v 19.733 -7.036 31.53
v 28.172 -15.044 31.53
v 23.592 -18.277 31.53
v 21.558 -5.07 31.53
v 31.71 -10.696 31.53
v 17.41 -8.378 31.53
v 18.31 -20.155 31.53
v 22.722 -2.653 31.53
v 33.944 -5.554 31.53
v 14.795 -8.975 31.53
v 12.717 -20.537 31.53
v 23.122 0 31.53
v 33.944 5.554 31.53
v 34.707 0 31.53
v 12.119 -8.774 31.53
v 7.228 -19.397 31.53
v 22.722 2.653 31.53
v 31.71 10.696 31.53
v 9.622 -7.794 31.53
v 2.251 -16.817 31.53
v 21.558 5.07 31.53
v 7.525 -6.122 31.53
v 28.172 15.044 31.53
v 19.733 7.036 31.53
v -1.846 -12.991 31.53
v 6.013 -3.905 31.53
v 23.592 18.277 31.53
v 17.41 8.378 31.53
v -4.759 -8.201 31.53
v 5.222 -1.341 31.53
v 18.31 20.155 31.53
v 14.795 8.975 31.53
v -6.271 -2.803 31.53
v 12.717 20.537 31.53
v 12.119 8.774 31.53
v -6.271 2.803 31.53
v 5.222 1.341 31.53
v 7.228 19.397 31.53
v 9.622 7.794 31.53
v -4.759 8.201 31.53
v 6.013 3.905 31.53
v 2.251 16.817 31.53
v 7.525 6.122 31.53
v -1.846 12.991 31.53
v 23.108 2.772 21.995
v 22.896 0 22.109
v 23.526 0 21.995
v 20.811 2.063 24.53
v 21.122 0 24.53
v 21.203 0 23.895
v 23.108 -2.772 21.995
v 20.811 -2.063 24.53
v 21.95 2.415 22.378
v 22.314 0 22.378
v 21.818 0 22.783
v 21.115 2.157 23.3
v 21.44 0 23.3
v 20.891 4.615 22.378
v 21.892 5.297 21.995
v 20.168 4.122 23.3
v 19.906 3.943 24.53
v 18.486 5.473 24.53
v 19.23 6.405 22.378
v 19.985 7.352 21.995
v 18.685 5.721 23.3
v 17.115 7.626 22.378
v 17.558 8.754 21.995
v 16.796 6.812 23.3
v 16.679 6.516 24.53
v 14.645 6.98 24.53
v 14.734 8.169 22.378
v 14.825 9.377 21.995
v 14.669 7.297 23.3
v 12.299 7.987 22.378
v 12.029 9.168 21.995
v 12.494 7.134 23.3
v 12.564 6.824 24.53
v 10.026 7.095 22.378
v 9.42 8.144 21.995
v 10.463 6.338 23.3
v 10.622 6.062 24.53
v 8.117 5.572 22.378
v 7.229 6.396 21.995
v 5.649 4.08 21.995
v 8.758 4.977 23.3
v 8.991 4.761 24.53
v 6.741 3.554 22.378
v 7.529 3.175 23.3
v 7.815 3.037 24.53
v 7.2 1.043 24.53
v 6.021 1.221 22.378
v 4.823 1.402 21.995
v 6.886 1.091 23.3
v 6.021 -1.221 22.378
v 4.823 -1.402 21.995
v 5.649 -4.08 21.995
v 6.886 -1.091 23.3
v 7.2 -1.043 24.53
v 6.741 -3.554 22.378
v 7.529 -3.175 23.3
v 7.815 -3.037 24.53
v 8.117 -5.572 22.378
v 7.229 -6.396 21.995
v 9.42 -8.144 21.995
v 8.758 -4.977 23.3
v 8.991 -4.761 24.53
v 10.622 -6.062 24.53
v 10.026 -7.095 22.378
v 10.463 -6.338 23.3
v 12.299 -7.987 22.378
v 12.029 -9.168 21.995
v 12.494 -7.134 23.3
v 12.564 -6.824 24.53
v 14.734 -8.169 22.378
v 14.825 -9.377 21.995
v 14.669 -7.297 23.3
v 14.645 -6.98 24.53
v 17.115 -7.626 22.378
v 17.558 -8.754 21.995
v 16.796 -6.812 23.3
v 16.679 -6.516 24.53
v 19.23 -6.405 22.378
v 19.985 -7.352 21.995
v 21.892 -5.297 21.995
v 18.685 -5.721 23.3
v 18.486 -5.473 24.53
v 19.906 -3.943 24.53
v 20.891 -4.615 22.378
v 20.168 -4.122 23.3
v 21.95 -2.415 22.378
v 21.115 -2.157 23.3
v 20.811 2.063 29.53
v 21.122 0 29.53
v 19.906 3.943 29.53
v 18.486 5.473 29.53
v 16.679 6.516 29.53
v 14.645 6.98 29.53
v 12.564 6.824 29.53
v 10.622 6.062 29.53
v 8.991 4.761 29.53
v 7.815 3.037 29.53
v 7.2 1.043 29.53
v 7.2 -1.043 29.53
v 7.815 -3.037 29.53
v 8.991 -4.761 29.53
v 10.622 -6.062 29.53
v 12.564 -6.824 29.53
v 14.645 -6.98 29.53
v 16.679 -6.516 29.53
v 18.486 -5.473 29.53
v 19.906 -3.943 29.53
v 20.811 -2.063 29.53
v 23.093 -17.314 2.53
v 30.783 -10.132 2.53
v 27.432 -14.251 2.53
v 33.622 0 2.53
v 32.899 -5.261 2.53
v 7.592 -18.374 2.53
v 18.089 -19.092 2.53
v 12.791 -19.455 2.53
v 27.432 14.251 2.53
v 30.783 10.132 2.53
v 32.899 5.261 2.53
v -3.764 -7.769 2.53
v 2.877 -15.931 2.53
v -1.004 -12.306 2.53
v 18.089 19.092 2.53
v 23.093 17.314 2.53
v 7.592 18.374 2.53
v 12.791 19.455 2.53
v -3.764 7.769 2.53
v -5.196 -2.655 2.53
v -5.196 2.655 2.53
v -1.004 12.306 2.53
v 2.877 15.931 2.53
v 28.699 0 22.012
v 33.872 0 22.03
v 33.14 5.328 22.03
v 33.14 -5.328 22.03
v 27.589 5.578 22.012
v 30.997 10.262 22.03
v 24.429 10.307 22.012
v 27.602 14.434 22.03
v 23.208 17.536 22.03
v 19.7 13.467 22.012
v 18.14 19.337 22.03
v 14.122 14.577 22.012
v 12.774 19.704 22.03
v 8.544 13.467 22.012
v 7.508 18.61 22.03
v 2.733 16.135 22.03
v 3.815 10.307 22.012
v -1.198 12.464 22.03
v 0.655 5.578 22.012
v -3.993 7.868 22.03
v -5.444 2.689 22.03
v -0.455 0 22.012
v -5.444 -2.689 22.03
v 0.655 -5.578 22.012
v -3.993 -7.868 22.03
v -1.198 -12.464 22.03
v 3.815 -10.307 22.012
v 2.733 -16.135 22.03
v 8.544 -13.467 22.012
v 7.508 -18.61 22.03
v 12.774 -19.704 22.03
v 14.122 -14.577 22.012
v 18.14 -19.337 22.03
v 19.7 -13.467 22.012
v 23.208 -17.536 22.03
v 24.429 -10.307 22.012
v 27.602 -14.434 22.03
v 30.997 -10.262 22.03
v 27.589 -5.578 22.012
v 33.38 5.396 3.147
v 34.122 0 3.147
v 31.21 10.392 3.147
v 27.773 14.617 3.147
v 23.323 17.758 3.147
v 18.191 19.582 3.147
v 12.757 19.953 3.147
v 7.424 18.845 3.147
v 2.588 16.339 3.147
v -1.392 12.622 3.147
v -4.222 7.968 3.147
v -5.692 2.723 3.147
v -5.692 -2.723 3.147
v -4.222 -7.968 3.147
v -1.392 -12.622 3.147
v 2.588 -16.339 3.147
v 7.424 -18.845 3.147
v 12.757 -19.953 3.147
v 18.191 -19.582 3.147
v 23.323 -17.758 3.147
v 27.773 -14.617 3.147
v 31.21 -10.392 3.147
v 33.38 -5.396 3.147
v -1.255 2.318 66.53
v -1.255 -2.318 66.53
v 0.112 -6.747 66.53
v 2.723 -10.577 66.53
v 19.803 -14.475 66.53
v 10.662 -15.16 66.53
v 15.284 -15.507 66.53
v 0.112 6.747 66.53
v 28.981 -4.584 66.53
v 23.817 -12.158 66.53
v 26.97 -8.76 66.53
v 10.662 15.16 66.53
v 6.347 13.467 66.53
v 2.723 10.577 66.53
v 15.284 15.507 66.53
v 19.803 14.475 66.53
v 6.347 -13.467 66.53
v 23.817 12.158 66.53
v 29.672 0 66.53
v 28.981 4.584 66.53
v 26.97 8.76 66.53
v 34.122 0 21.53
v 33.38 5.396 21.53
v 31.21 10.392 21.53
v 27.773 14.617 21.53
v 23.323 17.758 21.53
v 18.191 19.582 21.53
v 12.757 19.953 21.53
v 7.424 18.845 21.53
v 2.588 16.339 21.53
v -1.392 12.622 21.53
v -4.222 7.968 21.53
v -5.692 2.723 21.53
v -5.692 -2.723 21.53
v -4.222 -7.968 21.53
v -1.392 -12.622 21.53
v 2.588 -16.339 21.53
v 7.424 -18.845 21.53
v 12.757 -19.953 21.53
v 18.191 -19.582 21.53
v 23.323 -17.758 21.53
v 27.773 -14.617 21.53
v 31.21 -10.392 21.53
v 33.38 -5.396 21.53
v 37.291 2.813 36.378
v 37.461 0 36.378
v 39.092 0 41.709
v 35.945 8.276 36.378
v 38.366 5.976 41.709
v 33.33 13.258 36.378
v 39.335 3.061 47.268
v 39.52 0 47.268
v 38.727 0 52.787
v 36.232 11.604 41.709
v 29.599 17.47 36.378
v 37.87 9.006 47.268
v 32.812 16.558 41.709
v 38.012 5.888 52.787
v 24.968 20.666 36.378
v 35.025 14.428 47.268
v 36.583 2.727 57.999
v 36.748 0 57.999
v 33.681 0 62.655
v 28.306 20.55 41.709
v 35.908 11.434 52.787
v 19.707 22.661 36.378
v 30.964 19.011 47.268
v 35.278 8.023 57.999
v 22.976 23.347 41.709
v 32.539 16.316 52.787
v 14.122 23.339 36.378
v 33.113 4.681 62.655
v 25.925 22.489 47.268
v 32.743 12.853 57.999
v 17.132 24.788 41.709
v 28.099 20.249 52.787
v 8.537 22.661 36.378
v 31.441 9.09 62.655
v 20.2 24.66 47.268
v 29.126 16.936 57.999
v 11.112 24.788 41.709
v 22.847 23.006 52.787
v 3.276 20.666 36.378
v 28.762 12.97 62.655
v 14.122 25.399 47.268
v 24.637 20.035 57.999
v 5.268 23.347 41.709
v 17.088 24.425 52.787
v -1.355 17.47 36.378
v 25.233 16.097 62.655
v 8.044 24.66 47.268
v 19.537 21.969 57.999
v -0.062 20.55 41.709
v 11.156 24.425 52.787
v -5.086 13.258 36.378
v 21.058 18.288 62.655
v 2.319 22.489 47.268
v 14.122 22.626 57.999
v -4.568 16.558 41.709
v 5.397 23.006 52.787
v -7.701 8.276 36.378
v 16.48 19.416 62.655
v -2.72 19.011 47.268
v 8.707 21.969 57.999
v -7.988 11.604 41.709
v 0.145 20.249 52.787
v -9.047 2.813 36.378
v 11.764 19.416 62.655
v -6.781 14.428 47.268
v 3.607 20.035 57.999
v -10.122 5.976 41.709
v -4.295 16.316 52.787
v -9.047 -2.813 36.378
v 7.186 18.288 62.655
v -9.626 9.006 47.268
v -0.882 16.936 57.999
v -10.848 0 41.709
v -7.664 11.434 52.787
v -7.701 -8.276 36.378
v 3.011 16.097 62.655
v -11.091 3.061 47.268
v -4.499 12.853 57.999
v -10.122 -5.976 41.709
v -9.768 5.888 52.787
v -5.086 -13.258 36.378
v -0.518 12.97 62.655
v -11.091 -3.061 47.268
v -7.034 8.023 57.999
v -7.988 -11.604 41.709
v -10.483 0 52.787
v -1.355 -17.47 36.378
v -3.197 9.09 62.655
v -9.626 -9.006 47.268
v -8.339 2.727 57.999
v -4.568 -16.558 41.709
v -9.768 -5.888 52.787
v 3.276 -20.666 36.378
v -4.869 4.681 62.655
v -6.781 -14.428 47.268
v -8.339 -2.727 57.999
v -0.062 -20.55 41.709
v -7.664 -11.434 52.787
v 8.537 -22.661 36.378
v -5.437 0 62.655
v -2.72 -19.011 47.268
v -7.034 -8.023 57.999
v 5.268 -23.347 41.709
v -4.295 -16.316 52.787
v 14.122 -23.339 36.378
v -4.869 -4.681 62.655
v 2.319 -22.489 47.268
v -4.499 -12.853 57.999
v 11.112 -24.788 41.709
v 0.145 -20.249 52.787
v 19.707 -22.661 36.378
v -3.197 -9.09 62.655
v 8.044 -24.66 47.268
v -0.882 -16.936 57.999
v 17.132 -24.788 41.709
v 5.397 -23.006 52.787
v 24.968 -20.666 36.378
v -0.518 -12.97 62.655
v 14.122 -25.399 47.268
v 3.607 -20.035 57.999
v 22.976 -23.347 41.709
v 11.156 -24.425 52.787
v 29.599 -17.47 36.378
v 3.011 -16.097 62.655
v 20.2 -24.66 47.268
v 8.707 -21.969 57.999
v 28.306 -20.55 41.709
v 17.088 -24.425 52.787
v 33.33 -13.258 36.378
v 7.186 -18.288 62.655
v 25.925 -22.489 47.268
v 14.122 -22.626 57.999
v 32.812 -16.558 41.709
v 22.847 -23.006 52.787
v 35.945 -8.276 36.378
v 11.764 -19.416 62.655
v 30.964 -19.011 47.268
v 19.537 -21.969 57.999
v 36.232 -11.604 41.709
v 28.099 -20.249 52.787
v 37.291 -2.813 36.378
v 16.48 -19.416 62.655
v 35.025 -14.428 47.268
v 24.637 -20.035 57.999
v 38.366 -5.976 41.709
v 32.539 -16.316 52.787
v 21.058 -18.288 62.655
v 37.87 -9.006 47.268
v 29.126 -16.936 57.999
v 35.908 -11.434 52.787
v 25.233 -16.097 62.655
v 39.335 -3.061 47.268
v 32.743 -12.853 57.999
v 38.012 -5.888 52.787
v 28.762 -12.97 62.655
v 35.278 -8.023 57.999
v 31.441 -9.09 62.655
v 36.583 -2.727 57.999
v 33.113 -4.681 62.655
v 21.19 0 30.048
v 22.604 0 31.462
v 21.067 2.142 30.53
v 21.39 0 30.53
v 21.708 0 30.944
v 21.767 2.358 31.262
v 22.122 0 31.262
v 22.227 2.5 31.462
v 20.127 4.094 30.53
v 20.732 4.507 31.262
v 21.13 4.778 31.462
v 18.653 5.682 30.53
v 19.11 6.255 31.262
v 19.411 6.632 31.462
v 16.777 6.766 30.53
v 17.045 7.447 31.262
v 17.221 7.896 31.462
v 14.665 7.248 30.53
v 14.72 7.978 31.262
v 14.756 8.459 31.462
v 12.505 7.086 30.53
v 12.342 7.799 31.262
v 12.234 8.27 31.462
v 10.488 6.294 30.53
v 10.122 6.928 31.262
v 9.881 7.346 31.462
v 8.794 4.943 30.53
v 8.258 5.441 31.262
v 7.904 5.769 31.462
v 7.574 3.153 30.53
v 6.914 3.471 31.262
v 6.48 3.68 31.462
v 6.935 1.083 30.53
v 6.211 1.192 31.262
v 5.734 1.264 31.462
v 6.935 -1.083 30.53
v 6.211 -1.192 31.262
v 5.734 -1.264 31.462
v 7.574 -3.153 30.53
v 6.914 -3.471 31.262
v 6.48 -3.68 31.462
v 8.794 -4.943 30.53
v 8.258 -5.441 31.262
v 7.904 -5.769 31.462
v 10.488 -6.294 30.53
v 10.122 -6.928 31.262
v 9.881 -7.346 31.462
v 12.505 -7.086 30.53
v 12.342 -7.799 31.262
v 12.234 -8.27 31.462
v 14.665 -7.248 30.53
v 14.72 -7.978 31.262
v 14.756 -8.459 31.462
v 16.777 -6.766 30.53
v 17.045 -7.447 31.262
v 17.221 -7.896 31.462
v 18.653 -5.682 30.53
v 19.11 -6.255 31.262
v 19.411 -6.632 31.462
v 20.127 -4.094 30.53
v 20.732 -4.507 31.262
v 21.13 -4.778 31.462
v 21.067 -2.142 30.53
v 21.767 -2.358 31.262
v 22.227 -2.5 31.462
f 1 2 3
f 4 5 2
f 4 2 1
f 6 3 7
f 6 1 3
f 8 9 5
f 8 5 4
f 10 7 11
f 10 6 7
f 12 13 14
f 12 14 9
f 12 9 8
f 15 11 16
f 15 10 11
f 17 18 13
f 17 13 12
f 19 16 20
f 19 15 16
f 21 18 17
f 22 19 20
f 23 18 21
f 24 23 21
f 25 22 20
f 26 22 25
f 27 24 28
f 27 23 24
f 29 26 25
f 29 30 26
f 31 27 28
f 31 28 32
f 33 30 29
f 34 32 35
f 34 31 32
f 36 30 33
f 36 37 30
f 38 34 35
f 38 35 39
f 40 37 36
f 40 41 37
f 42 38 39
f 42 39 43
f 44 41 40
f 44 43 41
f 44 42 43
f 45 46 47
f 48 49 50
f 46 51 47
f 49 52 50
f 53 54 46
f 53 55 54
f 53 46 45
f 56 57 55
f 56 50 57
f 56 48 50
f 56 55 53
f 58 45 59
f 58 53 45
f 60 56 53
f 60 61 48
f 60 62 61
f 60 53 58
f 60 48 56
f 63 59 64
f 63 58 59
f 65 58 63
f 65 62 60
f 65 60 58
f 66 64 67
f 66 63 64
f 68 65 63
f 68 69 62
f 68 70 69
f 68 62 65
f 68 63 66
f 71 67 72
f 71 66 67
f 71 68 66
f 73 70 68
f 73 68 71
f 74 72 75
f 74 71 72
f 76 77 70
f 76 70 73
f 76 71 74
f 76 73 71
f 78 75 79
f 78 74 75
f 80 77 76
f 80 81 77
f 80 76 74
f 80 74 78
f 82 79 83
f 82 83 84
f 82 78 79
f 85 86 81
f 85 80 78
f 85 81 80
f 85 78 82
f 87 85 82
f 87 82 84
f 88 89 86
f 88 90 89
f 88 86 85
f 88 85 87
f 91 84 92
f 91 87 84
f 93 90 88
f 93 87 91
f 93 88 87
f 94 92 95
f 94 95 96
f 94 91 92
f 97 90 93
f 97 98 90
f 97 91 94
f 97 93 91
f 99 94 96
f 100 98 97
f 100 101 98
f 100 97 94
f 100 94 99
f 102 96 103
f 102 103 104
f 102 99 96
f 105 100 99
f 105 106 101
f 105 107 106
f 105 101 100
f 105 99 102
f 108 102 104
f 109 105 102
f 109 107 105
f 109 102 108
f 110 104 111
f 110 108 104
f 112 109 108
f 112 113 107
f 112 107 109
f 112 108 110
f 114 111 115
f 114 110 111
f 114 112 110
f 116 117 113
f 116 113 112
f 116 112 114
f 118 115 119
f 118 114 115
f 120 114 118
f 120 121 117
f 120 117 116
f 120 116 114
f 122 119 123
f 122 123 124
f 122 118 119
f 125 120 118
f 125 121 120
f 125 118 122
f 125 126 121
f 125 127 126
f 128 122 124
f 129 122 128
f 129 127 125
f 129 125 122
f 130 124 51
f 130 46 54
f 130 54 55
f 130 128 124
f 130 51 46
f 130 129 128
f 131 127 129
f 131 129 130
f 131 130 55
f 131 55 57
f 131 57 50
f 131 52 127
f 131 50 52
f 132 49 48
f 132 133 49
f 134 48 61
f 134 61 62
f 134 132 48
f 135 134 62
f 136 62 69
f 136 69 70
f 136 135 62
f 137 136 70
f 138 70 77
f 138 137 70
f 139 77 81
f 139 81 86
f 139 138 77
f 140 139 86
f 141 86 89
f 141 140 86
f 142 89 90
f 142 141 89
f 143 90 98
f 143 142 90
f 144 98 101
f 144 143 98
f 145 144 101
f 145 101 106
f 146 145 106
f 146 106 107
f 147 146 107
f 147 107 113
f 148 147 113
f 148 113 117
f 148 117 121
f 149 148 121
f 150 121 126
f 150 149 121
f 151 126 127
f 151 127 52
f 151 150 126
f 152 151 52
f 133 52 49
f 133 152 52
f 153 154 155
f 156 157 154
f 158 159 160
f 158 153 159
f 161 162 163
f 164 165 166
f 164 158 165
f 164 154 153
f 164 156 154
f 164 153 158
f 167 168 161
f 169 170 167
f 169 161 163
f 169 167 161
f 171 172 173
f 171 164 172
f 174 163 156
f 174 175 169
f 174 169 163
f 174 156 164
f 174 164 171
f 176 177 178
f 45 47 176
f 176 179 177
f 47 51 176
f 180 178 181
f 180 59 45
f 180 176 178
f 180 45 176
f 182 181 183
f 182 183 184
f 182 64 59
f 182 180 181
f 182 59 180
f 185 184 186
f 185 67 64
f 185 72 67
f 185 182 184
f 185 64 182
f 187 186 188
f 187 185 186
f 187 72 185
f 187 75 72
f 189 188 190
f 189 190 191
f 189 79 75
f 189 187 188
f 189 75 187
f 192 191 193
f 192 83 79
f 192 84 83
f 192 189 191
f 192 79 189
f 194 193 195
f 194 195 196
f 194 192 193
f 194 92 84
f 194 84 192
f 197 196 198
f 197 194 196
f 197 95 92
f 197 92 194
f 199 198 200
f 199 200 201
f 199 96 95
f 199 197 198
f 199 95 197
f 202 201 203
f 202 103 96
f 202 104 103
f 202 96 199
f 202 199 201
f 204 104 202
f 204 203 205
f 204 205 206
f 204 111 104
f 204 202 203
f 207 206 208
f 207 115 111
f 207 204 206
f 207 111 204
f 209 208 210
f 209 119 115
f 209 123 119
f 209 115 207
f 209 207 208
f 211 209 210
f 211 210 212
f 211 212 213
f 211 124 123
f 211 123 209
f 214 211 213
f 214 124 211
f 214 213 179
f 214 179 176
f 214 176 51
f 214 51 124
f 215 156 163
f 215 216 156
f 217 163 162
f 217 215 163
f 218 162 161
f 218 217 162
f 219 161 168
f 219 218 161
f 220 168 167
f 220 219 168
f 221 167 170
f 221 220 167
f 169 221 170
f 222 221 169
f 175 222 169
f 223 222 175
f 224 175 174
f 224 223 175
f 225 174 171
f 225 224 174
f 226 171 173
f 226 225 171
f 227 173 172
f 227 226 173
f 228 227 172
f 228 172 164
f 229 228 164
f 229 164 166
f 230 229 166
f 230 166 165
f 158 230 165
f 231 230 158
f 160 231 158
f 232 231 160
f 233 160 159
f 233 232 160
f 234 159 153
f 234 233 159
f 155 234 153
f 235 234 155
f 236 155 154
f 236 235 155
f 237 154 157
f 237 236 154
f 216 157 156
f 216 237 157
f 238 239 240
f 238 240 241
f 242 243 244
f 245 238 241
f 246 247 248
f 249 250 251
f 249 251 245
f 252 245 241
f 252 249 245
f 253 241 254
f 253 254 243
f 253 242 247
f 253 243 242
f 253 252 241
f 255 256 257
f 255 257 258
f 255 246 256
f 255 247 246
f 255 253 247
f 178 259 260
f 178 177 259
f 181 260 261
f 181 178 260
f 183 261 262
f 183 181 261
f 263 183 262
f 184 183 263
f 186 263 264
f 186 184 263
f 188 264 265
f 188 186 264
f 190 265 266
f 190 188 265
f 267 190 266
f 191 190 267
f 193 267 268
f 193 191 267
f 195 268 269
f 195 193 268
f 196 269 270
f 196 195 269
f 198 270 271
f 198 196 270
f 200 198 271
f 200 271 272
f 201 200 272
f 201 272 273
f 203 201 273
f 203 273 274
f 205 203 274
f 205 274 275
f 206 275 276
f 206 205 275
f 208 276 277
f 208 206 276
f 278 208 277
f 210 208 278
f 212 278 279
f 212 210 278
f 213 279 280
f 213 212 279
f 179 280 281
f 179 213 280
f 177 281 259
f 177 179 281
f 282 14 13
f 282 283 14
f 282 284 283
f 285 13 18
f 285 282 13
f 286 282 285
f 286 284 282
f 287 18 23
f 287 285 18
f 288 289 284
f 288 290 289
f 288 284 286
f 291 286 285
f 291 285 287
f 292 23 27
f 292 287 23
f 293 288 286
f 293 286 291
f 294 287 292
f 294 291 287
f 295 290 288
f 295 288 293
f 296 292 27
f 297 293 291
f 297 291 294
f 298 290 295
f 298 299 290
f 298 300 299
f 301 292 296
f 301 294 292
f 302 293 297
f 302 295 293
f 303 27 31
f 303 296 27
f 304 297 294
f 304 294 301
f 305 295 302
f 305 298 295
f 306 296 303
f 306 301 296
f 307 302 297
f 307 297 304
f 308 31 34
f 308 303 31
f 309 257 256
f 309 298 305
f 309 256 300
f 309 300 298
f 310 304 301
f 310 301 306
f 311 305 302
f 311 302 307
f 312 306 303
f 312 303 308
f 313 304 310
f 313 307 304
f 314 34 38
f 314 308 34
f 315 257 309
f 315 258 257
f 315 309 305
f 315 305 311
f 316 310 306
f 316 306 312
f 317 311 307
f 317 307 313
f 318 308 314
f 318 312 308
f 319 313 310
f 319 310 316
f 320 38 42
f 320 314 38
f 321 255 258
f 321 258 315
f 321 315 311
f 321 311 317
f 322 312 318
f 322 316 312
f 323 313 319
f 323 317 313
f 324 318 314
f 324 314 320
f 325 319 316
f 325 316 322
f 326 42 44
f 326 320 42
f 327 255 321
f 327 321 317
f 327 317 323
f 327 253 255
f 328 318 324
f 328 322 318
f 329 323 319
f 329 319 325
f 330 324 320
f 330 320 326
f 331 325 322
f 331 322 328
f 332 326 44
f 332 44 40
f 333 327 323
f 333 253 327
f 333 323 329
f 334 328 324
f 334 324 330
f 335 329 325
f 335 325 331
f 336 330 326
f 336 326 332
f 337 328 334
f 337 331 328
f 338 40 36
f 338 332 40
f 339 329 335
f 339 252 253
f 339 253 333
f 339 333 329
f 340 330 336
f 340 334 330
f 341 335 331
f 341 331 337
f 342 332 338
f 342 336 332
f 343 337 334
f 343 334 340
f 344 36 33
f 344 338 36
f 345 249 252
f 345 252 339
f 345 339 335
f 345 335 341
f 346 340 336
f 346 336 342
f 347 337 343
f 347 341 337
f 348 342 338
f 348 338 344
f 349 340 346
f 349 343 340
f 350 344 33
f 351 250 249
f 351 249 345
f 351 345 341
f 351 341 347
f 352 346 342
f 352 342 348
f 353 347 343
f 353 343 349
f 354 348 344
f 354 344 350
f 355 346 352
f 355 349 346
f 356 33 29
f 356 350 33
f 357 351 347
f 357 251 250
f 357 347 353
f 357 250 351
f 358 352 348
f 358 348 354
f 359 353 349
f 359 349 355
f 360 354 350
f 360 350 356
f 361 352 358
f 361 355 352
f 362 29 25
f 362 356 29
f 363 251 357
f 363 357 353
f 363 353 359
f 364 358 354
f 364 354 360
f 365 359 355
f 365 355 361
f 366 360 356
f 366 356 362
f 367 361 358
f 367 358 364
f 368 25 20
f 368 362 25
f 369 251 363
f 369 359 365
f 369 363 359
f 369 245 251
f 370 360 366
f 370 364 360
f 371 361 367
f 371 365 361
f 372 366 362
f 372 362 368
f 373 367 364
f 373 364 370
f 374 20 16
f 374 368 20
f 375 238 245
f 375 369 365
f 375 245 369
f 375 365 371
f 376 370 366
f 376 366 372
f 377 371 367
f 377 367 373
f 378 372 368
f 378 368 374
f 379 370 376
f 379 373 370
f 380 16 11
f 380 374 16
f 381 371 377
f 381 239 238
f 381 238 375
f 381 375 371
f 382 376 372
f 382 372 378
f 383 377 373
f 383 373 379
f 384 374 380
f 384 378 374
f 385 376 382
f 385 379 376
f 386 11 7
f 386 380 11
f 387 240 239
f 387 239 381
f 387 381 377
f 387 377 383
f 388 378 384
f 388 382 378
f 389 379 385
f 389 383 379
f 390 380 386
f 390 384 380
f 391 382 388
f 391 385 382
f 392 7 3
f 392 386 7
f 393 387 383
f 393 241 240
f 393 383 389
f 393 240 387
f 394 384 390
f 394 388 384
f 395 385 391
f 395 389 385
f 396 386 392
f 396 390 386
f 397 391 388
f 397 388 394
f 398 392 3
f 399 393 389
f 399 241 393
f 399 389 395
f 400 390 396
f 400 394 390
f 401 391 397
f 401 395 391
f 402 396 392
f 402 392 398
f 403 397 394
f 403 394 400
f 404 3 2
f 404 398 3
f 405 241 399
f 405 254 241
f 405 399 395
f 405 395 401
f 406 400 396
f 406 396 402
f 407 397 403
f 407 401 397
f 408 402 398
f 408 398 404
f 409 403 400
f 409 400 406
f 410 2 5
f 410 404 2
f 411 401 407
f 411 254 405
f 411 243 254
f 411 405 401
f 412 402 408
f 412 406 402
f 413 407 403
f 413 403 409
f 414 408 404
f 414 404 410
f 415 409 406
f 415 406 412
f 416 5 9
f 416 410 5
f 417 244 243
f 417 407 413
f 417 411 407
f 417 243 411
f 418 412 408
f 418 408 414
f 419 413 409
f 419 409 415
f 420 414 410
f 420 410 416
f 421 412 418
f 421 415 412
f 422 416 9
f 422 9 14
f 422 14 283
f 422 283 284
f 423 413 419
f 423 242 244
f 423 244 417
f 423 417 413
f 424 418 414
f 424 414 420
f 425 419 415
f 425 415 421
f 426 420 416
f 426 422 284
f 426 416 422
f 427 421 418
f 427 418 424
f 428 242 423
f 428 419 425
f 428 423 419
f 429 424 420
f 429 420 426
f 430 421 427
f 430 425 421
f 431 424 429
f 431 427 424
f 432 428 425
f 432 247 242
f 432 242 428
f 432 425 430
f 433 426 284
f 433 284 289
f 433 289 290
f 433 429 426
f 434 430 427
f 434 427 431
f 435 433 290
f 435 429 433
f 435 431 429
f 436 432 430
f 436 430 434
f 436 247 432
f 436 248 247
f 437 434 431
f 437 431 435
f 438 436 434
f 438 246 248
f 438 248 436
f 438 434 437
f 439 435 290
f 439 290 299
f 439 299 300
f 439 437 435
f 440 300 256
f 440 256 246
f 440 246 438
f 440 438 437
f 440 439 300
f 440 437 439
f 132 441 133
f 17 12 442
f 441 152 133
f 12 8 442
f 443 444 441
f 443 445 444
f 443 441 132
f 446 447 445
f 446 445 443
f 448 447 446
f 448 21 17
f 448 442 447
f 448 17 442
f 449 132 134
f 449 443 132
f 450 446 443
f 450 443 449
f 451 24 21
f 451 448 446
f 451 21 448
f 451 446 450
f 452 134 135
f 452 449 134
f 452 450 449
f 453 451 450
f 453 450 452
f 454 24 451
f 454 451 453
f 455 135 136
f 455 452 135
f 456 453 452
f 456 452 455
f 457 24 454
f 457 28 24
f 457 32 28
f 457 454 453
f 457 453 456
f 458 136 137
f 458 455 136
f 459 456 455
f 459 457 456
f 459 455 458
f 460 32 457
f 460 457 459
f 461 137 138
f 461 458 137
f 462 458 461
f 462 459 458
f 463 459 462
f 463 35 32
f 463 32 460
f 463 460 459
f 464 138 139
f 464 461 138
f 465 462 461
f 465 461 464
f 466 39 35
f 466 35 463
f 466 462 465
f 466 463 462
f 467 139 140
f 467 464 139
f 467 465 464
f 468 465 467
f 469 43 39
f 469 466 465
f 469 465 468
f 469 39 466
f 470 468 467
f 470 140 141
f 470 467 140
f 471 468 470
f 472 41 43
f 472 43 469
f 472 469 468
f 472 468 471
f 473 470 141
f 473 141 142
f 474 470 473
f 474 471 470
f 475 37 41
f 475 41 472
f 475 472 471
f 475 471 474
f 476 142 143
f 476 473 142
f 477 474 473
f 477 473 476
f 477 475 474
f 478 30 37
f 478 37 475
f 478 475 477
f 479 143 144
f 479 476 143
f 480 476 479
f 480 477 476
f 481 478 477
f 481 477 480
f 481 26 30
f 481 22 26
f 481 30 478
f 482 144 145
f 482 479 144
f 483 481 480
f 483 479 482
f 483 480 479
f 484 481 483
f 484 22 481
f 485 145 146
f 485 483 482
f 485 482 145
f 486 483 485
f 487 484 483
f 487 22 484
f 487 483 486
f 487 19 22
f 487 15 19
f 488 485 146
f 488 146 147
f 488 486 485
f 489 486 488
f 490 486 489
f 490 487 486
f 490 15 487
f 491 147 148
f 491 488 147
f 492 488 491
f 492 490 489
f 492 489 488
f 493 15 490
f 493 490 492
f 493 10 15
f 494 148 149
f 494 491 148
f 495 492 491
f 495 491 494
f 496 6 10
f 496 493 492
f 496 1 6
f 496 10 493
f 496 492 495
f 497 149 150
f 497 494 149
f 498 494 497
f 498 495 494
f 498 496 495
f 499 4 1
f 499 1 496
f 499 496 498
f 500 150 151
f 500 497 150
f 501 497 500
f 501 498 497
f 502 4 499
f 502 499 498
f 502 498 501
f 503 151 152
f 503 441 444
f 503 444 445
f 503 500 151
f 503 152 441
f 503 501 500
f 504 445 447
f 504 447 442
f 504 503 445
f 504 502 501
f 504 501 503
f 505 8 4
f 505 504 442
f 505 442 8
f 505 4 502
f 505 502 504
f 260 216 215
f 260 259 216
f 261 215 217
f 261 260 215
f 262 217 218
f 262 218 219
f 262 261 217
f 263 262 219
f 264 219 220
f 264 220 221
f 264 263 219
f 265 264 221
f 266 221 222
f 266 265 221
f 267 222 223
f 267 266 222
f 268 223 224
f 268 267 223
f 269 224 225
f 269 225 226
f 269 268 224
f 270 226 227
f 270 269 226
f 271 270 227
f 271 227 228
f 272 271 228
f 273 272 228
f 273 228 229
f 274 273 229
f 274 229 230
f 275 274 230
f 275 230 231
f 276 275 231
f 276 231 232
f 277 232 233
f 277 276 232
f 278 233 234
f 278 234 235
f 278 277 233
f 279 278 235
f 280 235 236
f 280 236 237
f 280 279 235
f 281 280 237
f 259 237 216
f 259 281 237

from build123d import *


with BuildPart() as part:
    # Sketch1 → Revolve1 (revolve)
    with BuildSketch(Plane(origin=(0, 0, 0), x_dir=(1, 0, 0), z_dir=(0, 1, 0))):
        with BuildLine():
            Line((18.554185143, -2.529876216), (28.121974873, -2.529876216))
            Line((28.121974873, -2.529876216), (33.621974873, -2.529876216))
            Line((33.621974873, -2.529876216), (34.121974873, -3.147134349))
            Line((34.121974873, -3.147134349), (34.121974873, -16.947673594))
            Line((34.121974873, -16.947673594), (34.121974873, -21.529876216))
            Line((34.121974873, -21.529876216), (33.871974873, -22.029876216))
            Line((33.871974873, -22.029876216), (23.525737468, -21.994577645))
            ThreePointArc((23.525737468, -21.994577645), (21.818442704, -22.783035248), (21.121974873, -24.529876216))
            Line((21.121974873, -24.529876216), (21.121974873, -29.529876216))
            ThreePointArc((21.121974873, -29.529876216), (21.70776131, -30.944089778), (23.121974873, -31.529876216))
            Line((23.121974873, -31.529876216), (23.163890071, -31.529876216))
            Line((23.163890071, -31.529876216), (25.892484704, -31.529876216))
            Line((25.892484704, -31.529876216), (34.707125886, -31.529876216))
            ThreePointArc((34.707125886, -31.529876216), (39.275357094, -50.049169414), (29.672271119, -66.529876216))
            Line((29.672271119, -66.529876216), (19.091113774, -66.529876216))
            Line((19.091113774, -66.529876216), (14.121974873, -66.529876216))
            Line((14.121974873, -66.529876216), (14.121974873, -2.529876216))
            Line((14.121974873, -2.529876216), (18.554185143, -2.529876216))
        make_face()
    revolve(axis=Axis((14.121974873, 0, 2.529876216), (0, 0, 1)))


solid = part.part
